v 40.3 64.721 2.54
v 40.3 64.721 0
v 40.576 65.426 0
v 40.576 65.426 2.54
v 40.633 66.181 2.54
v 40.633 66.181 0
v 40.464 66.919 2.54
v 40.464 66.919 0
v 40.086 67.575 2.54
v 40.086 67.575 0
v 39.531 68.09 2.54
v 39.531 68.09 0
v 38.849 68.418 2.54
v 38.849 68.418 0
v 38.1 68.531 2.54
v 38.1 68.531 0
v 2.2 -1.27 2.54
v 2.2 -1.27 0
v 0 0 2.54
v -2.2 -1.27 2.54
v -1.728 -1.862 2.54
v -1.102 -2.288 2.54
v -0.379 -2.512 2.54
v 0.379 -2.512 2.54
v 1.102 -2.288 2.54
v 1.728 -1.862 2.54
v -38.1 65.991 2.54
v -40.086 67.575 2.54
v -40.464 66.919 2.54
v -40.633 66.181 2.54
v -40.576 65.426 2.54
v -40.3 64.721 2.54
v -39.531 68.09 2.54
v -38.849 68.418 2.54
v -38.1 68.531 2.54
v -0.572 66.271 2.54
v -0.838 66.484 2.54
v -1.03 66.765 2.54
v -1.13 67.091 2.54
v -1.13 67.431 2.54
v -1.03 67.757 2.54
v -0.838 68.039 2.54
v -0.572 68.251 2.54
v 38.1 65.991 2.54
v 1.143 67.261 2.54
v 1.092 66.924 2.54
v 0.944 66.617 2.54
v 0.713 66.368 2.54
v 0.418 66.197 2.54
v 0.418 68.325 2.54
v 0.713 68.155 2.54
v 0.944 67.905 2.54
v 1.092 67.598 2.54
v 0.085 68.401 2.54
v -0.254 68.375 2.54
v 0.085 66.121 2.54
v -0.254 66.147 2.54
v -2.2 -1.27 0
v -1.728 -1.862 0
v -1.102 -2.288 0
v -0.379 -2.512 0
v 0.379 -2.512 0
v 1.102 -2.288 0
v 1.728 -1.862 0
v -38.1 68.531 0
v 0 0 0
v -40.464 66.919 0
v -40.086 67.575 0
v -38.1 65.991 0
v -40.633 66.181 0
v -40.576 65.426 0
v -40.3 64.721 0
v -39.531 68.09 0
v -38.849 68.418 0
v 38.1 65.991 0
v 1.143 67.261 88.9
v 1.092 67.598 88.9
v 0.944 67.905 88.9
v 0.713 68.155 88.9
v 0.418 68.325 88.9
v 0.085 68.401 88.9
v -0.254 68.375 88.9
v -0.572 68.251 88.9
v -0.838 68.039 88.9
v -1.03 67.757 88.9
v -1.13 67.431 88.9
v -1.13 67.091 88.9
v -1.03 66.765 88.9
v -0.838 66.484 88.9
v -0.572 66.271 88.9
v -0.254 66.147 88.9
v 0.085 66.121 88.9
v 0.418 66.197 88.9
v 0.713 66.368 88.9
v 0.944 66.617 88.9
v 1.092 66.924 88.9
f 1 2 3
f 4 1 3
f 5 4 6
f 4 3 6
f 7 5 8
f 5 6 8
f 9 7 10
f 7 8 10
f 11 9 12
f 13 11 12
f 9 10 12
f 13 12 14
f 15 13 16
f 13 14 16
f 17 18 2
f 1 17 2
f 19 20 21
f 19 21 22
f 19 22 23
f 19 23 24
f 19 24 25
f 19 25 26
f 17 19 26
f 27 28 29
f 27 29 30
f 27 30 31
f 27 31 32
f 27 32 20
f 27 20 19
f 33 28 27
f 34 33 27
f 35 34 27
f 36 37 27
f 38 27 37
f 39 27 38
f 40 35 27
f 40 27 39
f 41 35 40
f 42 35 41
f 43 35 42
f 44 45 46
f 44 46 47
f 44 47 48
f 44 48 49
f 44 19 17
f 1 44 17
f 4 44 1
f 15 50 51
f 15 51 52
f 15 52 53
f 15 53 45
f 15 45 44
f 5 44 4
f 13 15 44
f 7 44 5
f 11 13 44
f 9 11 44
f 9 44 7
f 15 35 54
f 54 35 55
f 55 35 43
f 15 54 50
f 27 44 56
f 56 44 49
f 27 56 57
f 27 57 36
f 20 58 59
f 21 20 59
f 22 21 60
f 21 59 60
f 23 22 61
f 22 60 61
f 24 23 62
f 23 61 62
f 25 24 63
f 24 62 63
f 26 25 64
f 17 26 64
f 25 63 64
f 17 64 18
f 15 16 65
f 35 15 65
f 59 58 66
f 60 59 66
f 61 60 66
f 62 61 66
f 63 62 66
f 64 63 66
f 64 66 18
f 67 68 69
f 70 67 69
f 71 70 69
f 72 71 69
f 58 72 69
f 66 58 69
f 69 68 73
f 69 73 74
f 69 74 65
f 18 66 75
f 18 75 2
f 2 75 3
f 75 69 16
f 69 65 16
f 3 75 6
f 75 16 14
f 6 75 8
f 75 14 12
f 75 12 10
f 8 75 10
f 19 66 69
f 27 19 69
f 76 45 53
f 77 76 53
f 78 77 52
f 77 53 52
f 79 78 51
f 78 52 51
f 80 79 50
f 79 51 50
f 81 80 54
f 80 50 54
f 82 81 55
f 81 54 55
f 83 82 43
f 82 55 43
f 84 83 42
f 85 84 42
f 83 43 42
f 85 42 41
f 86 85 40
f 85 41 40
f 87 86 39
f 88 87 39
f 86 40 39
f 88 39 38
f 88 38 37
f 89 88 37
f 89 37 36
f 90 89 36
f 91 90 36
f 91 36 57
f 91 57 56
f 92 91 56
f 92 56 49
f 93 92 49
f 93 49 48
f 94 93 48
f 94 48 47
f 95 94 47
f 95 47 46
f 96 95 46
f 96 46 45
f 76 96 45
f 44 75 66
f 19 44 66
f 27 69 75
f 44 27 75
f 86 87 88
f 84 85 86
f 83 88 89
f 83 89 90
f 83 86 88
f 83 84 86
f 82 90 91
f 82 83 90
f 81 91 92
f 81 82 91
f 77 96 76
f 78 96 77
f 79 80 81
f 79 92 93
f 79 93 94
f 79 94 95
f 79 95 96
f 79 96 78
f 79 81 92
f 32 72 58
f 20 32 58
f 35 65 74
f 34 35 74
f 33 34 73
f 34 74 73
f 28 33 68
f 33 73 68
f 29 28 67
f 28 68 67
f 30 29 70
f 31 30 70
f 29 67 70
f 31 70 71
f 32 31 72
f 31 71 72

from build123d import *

# Parameters (mm, degrees)
F1_DEPTH = 2.54
F2_R     = 1.143
F3_DEPTH = 88.9


with BuildPart() as f1:
    # F0 (on Top) → F1 (new body)
    with BuildSketch(Plane.XY):
        with BuildLine():
            Line((38.1, 68.531136), (-38.1, 68.531136))
            ThreePointArc((-38.1, 68.531136), (-40.299705, 67.261136), (-40.299705, 64.721136))
            Line((-40.299705, 64.721136), (-2.199705, -1.27))
            ThreePointArc((-2.199705, -1.27), (0, -2.54), (2.199705, -1.27))
            Line((2.199705, -1.27), (40.299705, 64.721136))
            ThreePointArc((40.299705, 64.721136), (40.299705, 67.261136), (38.1, 68.531136))
        make_face()
        Polygon((38.1, 65.991136), (0, 0), (-38.1, 65.991136), align=None, mode=Mode.SUBTRACT)
    extrude(amount=F1_DEPTH)

    # F2 (on Top) → F3 (join)
    with BuildSketch(Plane.XY):
        with Locations((0, 67.261136)):
            Circle(F2_R)
    extrude(amount=F3_DEPTH)


solid = f1.part
